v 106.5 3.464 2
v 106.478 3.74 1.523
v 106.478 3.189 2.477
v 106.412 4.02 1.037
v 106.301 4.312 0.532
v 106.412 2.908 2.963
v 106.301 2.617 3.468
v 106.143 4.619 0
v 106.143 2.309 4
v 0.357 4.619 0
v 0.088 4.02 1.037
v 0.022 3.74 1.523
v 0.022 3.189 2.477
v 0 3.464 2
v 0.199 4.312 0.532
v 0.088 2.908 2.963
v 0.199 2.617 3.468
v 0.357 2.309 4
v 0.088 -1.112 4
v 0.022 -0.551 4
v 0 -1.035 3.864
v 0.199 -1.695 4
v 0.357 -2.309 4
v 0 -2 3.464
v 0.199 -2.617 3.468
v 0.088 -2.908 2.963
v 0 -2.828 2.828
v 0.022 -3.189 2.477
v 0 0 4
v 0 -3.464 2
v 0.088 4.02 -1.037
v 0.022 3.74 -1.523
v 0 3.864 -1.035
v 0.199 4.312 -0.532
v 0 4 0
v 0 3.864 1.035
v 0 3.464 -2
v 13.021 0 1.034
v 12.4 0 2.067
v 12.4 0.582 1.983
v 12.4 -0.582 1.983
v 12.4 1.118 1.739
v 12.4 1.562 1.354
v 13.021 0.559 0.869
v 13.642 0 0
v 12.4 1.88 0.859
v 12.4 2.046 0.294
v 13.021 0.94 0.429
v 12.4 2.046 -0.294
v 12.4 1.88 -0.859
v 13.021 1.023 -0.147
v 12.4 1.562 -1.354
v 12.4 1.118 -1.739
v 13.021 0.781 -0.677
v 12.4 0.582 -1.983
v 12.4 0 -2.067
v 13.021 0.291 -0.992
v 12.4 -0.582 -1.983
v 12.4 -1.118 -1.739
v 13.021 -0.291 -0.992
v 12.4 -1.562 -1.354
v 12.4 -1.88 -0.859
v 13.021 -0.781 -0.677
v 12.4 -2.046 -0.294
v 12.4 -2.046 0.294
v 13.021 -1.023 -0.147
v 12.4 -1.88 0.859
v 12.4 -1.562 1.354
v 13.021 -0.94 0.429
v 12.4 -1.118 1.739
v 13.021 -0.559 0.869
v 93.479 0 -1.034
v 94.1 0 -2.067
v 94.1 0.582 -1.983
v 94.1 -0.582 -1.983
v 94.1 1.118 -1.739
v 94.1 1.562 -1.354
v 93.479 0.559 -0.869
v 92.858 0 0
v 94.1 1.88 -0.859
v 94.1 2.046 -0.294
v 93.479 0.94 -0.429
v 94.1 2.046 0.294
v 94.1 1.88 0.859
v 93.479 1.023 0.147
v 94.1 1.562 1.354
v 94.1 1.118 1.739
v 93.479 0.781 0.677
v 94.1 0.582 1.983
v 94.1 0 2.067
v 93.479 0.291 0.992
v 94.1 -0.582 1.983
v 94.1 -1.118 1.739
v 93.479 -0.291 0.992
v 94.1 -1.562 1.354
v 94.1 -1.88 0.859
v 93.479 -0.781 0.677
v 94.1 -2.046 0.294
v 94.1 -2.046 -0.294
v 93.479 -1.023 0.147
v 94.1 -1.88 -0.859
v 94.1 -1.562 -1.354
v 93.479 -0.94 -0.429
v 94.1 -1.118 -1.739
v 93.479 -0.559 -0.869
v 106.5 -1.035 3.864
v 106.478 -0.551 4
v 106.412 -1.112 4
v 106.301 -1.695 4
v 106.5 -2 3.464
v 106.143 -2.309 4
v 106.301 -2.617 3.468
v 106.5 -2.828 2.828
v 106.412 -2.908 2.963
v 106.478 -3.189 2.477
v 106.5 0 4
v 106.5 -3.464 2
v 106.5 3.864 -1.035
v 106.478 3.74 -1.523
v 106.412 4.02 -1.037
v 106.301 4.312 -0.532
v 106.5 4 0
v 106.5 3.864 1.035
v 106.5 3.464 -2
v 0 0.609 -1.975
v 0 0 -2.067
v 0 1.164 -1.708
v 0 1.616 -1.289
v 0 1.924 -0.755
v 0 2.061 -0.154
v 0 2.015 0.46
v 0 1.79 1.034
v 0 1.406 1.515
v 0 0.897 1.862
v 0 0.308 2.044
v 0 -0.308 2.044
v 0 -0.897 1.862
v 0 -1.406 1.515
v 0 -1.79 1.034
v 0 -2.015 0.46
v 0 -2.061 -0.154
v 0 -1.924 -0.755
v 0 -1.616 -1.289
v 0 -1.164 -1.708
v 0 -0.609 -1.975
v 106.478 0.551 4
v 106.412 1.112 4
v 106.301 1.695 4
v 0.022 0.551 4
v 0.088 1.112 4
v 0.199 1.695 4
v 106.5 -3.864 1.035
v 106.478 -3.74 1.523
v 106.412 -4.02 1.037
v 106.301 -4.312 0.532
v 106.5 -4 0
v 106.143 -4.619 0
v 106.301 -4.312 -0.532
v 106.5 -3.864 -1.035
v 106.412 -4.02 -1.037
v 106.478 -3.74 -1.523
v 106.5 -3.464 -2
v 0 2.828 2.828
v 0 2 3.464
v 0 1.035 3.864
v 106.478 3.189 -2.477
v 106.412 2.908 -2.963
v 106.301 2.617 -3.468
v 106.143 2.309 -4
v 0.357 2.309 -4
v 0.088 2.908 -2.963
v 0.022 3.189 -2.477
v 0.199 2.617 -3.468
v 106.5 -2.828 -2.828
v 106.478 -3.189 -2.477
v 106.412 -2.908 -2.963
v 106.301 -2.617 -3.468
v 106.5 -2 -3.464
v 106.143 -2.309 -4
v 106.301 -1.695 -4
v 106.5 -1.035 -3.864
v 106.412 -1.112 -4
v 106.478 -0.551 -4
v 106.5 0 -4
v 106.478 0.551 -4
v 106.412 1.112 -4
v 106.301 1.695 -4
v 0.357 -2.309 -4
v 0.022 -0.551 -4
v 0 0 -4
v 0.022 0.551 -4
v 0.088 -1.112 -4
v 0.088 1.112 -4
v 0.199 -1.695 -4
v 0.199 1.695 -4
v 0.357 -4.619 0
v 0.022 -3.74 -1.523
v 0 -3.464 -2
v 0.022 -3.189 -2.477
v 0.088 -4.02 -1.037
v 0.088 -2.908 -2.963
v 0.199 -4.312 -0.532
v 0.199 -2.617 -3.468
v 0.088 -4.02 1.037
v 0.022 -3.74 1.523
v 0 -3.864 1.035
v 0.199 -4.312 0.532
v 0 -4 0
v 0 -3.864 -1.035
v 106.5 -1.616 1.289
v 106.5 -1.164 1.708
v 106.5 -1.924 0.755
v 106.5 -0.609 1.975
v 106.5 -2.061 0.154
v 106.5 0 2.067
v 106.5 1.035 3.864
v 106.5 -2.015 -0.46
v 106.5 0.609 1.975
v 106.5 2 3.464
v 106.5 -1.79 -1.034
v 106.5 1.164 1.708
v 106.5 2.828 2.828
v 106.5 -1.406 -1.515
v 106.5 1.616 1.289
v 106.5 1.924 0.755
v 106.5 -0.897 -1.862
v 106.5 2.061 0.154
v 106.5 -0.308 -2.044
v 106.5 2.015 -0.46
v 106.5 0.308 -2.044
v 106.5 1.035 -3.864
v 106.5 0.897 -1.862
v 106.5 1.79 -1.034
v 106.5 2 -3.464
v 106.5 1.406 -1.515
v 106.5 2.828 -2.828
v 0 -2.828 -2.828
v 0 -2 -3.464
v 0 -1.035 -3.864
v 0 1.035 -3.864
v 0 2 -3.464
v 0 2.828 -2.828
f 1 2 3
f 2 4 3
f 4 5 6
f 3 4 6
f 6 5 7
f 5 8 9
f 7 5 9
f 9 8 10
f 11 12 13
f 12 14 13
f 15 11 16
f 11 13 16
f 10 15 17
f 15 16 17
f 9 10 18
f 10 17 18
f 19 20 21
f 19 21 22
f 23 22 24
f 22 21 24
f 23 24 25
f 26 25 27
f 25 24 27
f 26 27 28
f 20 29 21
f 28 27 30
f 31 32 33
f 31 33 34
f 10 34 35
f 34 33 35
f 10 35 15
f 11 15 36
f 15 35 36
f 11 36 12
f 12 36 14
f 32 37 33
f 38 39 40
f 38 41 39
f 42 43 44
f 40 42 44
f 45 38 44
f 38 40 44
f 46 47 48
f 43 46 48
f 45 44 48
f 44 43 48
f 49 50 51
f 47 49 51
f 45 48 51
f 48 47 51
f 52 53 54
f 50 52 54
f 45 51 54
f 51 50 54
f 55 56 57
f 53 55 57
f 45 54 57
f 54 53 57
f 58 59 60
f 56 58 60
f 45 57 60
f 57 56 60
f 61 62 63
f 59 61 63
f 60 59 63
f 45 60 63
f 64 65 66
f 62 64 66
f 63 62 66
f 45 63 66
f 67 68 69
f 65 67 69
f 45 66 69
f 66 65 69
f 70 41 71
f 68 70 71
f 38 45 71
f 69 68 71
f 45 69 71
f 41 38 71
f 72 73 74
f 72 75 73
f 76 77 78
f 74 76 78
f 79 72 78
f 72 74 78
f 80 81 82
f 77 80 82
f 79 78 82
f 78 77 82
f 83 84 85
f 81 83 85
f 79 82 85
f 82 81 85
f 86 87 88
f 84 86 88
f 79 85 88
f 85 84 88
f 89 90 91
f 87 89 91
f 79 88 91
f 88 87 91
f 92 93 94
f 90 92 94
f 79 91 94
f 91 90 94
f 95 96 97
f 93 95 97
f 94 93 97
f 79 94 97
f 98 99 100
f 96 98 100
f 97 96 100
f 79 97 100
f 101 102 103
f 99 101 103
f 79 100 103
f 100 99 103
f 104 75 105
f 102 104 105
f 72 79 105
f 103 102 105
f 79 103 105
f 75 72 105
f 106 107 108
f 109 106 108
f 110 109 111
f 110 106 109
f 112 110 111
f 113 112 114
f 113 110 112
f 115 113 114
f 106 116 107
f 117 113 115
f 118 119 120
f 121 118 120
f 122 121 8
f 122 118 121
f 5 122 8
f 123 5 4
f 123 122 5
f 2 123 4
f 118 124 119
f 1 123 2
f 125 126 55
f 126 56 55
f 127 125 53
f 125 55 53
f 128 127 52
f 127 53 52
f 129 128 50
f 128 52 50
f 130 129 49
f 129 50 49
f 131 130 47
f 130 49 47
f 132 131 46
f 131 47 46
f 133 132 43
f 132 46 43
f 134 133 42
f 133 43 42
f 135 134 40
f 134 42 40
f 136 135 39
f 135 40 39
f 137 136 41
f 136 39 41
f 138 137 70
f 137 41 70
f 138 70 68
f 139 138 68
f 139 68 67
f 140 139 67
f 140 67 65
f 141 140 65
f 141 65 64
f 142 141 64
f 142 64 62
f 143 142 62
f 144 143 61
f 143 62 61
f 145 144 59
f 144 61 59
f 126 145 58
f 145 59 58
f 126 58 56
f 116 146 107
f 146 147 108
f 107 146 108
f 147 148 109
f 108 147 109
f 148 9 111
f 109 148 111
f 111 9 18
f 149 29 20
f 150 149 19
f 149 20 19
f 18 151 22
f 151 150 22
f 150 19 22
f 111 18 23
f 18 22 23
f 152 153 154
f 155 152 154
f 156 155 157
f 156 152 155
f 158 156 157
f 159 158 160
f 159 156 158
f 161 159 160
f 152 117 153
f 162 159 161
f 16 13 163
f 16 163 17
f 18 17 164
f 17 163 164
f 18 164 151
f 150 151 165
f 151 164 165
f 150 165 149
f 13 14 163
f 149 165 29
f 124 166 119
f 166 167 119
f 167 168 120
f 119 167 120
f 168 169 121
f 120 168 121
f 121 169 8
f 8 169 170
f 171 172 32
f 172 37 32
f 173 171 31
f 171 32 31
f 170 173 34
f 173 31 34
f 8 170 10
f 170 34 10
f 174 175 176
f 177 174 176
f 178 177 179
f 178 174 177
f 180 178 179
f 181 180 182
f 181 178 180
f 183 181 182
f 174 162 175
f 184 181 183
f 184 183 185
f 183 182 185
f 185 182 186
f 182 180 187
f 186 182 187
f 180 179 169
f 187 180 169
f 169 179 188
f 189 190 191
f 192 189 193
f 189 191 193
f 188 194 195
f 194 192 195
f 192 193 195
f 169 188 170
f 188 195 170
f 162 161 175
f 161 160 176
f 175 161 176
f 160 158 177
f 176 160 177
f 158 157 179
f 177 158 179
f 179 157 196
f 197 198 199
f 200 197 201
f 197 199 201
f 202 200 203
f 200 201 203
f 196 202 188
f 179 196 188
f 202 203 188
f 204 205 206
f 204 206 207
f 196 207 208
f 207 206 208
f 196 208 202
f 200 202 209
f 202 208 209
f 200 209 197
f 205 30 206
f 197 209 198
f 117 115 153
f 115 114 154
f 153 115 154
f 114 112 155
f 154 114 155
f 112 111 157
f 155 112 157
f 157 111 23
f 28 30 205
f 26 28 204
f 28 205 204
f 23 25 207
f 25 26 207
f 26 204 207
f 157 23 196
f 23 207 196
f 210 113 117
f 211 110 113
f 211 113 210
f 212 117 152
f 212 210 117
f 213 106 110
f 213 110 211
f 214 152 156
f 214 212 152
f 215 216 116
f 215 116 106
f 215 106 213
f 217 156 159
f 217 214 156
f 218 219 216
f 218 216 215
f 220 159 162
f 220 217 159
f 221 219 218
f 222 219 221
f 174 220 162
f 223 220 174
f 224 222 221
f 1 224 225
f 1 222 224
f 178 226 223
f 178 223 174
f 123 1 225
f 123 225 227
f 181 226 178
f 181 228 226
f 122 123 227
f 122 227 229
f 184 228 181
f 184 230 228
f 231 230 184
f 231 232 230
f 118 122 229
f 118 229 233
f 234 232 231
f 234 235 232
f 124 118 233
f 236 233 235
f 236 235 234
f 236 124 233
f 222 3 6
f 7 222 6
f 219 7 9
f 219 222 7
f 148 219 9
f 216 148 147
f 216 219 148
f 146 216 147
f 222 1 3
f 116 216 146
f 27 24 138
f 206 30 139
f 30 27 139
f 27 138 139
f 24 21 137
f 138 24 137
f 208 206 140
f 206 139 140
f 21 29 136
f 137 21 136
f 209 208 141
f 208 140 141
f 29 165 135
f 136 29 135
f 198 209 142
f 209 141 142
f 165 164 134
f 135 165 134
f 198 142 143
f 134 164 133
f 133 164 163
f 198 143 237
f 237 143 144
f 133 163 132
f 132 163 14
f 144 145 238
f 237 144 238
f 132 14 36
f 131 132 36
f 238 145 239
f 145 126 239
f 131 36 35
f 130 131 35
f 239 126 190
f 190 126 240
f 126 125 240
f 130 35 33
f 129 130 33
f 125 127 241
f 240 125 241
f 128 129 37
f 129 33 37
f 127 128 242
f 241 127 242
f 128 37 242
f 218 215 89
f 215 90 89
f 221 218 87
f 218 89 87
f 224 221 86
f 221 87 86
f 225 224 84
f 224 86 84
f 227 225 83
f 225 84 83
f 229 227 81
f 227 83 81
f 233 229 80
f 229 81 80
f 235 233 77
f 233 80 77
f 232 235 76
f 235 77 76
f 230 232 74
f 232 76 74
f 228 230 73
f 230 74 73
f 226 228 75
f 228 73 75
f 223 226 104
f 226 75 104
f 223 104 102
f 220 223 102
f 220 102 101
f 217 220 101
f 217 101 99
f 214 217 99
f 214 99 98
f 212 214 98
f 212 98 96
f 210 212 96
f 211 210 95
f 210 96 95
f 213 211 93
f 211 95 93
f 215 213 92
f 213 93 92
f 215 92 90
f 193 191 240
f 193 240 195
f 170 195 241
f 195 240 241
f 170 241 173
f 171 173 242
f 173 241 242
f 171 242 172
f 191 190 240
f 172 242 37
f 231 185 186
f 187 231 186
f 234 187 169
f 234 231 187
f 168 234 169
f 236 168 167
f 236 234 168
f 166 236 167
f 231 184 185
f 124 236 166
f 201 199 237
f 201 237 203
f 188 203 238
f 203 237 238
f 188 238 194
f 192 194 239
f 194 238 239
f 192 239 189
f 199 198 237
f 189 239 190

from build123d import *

# Parameters (mm, degrees)
BOSS_EXTRUDE1_DEPTH = 106.5
TAP1_D              = 4.134
TAP1_DEPTH          = 12.4
TAP1_TIP            = 1.2419789
TAP2_D              = 4.134
TAP2_DEPTH          = 12.4
TAP2_TIP            = 1.2419789


with BuildPart() as part:
    # Sketch1 → Boss-Extrude1 (new body)
    with BuildSketch(Plane(origin=(0, 0, 0), x_dir=(0, 0, -1), z_dir=(1, 0, 0))):
        Polygon((0, -4.618802154), (4, -2.309401077), (4, 2.309401077), (0, 4.618802154), (-4, 2.309401077), (-4, -2.309401077), align=None)
    extrude(amount=BOSS_EXTRUDE1_DEPTH)

    # Sketch2 → Cut-Revolve1 (revolve, cut)
    with BuildSketch(Plane.XY):
        Polygon((0, 4.618802154), (0.35726559, 4.618802154), (0, 4), align=None)
        Polygon((106.14273441, 4.618802154), (106.5, 4), (106.5, 4.618802154), align=None)
    revolve(axis=Axis((0, 0, 0), (1, 0, 0)), mode=Mode.SUBTRACT)

    # Tap1
    with Locations(Plane.ZY):
        with Locations((0, 0)):
            Hole(TAP1_D / 2, depth=TAP1_DEPTH)
            with Locations((0, 0, -(TAP1_DEPTH + TAP1_TIP / 2))):  # 118° drill point
                Cone(0, TAP1_D / 2, TAP1_TIP, mode=Mode.SUBTRACT)

    # Tap2
    with Locations(Plane(origin=(106.5, 0, 0), x_dir=(0, 0, -1), z_dir=(1, 0, 0))):
        with Locations((0, 0)):
            Hole(TAP2_D / 2, depth=TAP2_DEPTH)
            with Locations((0, 0, -(TAP2_DEPTH + TAP2_TIP / 2))):  # 118° drill point
                Cone(0, TAP2_D / 2, TAP2_TIP, mode=Mode.SUBTRACT)


solid = part.part
